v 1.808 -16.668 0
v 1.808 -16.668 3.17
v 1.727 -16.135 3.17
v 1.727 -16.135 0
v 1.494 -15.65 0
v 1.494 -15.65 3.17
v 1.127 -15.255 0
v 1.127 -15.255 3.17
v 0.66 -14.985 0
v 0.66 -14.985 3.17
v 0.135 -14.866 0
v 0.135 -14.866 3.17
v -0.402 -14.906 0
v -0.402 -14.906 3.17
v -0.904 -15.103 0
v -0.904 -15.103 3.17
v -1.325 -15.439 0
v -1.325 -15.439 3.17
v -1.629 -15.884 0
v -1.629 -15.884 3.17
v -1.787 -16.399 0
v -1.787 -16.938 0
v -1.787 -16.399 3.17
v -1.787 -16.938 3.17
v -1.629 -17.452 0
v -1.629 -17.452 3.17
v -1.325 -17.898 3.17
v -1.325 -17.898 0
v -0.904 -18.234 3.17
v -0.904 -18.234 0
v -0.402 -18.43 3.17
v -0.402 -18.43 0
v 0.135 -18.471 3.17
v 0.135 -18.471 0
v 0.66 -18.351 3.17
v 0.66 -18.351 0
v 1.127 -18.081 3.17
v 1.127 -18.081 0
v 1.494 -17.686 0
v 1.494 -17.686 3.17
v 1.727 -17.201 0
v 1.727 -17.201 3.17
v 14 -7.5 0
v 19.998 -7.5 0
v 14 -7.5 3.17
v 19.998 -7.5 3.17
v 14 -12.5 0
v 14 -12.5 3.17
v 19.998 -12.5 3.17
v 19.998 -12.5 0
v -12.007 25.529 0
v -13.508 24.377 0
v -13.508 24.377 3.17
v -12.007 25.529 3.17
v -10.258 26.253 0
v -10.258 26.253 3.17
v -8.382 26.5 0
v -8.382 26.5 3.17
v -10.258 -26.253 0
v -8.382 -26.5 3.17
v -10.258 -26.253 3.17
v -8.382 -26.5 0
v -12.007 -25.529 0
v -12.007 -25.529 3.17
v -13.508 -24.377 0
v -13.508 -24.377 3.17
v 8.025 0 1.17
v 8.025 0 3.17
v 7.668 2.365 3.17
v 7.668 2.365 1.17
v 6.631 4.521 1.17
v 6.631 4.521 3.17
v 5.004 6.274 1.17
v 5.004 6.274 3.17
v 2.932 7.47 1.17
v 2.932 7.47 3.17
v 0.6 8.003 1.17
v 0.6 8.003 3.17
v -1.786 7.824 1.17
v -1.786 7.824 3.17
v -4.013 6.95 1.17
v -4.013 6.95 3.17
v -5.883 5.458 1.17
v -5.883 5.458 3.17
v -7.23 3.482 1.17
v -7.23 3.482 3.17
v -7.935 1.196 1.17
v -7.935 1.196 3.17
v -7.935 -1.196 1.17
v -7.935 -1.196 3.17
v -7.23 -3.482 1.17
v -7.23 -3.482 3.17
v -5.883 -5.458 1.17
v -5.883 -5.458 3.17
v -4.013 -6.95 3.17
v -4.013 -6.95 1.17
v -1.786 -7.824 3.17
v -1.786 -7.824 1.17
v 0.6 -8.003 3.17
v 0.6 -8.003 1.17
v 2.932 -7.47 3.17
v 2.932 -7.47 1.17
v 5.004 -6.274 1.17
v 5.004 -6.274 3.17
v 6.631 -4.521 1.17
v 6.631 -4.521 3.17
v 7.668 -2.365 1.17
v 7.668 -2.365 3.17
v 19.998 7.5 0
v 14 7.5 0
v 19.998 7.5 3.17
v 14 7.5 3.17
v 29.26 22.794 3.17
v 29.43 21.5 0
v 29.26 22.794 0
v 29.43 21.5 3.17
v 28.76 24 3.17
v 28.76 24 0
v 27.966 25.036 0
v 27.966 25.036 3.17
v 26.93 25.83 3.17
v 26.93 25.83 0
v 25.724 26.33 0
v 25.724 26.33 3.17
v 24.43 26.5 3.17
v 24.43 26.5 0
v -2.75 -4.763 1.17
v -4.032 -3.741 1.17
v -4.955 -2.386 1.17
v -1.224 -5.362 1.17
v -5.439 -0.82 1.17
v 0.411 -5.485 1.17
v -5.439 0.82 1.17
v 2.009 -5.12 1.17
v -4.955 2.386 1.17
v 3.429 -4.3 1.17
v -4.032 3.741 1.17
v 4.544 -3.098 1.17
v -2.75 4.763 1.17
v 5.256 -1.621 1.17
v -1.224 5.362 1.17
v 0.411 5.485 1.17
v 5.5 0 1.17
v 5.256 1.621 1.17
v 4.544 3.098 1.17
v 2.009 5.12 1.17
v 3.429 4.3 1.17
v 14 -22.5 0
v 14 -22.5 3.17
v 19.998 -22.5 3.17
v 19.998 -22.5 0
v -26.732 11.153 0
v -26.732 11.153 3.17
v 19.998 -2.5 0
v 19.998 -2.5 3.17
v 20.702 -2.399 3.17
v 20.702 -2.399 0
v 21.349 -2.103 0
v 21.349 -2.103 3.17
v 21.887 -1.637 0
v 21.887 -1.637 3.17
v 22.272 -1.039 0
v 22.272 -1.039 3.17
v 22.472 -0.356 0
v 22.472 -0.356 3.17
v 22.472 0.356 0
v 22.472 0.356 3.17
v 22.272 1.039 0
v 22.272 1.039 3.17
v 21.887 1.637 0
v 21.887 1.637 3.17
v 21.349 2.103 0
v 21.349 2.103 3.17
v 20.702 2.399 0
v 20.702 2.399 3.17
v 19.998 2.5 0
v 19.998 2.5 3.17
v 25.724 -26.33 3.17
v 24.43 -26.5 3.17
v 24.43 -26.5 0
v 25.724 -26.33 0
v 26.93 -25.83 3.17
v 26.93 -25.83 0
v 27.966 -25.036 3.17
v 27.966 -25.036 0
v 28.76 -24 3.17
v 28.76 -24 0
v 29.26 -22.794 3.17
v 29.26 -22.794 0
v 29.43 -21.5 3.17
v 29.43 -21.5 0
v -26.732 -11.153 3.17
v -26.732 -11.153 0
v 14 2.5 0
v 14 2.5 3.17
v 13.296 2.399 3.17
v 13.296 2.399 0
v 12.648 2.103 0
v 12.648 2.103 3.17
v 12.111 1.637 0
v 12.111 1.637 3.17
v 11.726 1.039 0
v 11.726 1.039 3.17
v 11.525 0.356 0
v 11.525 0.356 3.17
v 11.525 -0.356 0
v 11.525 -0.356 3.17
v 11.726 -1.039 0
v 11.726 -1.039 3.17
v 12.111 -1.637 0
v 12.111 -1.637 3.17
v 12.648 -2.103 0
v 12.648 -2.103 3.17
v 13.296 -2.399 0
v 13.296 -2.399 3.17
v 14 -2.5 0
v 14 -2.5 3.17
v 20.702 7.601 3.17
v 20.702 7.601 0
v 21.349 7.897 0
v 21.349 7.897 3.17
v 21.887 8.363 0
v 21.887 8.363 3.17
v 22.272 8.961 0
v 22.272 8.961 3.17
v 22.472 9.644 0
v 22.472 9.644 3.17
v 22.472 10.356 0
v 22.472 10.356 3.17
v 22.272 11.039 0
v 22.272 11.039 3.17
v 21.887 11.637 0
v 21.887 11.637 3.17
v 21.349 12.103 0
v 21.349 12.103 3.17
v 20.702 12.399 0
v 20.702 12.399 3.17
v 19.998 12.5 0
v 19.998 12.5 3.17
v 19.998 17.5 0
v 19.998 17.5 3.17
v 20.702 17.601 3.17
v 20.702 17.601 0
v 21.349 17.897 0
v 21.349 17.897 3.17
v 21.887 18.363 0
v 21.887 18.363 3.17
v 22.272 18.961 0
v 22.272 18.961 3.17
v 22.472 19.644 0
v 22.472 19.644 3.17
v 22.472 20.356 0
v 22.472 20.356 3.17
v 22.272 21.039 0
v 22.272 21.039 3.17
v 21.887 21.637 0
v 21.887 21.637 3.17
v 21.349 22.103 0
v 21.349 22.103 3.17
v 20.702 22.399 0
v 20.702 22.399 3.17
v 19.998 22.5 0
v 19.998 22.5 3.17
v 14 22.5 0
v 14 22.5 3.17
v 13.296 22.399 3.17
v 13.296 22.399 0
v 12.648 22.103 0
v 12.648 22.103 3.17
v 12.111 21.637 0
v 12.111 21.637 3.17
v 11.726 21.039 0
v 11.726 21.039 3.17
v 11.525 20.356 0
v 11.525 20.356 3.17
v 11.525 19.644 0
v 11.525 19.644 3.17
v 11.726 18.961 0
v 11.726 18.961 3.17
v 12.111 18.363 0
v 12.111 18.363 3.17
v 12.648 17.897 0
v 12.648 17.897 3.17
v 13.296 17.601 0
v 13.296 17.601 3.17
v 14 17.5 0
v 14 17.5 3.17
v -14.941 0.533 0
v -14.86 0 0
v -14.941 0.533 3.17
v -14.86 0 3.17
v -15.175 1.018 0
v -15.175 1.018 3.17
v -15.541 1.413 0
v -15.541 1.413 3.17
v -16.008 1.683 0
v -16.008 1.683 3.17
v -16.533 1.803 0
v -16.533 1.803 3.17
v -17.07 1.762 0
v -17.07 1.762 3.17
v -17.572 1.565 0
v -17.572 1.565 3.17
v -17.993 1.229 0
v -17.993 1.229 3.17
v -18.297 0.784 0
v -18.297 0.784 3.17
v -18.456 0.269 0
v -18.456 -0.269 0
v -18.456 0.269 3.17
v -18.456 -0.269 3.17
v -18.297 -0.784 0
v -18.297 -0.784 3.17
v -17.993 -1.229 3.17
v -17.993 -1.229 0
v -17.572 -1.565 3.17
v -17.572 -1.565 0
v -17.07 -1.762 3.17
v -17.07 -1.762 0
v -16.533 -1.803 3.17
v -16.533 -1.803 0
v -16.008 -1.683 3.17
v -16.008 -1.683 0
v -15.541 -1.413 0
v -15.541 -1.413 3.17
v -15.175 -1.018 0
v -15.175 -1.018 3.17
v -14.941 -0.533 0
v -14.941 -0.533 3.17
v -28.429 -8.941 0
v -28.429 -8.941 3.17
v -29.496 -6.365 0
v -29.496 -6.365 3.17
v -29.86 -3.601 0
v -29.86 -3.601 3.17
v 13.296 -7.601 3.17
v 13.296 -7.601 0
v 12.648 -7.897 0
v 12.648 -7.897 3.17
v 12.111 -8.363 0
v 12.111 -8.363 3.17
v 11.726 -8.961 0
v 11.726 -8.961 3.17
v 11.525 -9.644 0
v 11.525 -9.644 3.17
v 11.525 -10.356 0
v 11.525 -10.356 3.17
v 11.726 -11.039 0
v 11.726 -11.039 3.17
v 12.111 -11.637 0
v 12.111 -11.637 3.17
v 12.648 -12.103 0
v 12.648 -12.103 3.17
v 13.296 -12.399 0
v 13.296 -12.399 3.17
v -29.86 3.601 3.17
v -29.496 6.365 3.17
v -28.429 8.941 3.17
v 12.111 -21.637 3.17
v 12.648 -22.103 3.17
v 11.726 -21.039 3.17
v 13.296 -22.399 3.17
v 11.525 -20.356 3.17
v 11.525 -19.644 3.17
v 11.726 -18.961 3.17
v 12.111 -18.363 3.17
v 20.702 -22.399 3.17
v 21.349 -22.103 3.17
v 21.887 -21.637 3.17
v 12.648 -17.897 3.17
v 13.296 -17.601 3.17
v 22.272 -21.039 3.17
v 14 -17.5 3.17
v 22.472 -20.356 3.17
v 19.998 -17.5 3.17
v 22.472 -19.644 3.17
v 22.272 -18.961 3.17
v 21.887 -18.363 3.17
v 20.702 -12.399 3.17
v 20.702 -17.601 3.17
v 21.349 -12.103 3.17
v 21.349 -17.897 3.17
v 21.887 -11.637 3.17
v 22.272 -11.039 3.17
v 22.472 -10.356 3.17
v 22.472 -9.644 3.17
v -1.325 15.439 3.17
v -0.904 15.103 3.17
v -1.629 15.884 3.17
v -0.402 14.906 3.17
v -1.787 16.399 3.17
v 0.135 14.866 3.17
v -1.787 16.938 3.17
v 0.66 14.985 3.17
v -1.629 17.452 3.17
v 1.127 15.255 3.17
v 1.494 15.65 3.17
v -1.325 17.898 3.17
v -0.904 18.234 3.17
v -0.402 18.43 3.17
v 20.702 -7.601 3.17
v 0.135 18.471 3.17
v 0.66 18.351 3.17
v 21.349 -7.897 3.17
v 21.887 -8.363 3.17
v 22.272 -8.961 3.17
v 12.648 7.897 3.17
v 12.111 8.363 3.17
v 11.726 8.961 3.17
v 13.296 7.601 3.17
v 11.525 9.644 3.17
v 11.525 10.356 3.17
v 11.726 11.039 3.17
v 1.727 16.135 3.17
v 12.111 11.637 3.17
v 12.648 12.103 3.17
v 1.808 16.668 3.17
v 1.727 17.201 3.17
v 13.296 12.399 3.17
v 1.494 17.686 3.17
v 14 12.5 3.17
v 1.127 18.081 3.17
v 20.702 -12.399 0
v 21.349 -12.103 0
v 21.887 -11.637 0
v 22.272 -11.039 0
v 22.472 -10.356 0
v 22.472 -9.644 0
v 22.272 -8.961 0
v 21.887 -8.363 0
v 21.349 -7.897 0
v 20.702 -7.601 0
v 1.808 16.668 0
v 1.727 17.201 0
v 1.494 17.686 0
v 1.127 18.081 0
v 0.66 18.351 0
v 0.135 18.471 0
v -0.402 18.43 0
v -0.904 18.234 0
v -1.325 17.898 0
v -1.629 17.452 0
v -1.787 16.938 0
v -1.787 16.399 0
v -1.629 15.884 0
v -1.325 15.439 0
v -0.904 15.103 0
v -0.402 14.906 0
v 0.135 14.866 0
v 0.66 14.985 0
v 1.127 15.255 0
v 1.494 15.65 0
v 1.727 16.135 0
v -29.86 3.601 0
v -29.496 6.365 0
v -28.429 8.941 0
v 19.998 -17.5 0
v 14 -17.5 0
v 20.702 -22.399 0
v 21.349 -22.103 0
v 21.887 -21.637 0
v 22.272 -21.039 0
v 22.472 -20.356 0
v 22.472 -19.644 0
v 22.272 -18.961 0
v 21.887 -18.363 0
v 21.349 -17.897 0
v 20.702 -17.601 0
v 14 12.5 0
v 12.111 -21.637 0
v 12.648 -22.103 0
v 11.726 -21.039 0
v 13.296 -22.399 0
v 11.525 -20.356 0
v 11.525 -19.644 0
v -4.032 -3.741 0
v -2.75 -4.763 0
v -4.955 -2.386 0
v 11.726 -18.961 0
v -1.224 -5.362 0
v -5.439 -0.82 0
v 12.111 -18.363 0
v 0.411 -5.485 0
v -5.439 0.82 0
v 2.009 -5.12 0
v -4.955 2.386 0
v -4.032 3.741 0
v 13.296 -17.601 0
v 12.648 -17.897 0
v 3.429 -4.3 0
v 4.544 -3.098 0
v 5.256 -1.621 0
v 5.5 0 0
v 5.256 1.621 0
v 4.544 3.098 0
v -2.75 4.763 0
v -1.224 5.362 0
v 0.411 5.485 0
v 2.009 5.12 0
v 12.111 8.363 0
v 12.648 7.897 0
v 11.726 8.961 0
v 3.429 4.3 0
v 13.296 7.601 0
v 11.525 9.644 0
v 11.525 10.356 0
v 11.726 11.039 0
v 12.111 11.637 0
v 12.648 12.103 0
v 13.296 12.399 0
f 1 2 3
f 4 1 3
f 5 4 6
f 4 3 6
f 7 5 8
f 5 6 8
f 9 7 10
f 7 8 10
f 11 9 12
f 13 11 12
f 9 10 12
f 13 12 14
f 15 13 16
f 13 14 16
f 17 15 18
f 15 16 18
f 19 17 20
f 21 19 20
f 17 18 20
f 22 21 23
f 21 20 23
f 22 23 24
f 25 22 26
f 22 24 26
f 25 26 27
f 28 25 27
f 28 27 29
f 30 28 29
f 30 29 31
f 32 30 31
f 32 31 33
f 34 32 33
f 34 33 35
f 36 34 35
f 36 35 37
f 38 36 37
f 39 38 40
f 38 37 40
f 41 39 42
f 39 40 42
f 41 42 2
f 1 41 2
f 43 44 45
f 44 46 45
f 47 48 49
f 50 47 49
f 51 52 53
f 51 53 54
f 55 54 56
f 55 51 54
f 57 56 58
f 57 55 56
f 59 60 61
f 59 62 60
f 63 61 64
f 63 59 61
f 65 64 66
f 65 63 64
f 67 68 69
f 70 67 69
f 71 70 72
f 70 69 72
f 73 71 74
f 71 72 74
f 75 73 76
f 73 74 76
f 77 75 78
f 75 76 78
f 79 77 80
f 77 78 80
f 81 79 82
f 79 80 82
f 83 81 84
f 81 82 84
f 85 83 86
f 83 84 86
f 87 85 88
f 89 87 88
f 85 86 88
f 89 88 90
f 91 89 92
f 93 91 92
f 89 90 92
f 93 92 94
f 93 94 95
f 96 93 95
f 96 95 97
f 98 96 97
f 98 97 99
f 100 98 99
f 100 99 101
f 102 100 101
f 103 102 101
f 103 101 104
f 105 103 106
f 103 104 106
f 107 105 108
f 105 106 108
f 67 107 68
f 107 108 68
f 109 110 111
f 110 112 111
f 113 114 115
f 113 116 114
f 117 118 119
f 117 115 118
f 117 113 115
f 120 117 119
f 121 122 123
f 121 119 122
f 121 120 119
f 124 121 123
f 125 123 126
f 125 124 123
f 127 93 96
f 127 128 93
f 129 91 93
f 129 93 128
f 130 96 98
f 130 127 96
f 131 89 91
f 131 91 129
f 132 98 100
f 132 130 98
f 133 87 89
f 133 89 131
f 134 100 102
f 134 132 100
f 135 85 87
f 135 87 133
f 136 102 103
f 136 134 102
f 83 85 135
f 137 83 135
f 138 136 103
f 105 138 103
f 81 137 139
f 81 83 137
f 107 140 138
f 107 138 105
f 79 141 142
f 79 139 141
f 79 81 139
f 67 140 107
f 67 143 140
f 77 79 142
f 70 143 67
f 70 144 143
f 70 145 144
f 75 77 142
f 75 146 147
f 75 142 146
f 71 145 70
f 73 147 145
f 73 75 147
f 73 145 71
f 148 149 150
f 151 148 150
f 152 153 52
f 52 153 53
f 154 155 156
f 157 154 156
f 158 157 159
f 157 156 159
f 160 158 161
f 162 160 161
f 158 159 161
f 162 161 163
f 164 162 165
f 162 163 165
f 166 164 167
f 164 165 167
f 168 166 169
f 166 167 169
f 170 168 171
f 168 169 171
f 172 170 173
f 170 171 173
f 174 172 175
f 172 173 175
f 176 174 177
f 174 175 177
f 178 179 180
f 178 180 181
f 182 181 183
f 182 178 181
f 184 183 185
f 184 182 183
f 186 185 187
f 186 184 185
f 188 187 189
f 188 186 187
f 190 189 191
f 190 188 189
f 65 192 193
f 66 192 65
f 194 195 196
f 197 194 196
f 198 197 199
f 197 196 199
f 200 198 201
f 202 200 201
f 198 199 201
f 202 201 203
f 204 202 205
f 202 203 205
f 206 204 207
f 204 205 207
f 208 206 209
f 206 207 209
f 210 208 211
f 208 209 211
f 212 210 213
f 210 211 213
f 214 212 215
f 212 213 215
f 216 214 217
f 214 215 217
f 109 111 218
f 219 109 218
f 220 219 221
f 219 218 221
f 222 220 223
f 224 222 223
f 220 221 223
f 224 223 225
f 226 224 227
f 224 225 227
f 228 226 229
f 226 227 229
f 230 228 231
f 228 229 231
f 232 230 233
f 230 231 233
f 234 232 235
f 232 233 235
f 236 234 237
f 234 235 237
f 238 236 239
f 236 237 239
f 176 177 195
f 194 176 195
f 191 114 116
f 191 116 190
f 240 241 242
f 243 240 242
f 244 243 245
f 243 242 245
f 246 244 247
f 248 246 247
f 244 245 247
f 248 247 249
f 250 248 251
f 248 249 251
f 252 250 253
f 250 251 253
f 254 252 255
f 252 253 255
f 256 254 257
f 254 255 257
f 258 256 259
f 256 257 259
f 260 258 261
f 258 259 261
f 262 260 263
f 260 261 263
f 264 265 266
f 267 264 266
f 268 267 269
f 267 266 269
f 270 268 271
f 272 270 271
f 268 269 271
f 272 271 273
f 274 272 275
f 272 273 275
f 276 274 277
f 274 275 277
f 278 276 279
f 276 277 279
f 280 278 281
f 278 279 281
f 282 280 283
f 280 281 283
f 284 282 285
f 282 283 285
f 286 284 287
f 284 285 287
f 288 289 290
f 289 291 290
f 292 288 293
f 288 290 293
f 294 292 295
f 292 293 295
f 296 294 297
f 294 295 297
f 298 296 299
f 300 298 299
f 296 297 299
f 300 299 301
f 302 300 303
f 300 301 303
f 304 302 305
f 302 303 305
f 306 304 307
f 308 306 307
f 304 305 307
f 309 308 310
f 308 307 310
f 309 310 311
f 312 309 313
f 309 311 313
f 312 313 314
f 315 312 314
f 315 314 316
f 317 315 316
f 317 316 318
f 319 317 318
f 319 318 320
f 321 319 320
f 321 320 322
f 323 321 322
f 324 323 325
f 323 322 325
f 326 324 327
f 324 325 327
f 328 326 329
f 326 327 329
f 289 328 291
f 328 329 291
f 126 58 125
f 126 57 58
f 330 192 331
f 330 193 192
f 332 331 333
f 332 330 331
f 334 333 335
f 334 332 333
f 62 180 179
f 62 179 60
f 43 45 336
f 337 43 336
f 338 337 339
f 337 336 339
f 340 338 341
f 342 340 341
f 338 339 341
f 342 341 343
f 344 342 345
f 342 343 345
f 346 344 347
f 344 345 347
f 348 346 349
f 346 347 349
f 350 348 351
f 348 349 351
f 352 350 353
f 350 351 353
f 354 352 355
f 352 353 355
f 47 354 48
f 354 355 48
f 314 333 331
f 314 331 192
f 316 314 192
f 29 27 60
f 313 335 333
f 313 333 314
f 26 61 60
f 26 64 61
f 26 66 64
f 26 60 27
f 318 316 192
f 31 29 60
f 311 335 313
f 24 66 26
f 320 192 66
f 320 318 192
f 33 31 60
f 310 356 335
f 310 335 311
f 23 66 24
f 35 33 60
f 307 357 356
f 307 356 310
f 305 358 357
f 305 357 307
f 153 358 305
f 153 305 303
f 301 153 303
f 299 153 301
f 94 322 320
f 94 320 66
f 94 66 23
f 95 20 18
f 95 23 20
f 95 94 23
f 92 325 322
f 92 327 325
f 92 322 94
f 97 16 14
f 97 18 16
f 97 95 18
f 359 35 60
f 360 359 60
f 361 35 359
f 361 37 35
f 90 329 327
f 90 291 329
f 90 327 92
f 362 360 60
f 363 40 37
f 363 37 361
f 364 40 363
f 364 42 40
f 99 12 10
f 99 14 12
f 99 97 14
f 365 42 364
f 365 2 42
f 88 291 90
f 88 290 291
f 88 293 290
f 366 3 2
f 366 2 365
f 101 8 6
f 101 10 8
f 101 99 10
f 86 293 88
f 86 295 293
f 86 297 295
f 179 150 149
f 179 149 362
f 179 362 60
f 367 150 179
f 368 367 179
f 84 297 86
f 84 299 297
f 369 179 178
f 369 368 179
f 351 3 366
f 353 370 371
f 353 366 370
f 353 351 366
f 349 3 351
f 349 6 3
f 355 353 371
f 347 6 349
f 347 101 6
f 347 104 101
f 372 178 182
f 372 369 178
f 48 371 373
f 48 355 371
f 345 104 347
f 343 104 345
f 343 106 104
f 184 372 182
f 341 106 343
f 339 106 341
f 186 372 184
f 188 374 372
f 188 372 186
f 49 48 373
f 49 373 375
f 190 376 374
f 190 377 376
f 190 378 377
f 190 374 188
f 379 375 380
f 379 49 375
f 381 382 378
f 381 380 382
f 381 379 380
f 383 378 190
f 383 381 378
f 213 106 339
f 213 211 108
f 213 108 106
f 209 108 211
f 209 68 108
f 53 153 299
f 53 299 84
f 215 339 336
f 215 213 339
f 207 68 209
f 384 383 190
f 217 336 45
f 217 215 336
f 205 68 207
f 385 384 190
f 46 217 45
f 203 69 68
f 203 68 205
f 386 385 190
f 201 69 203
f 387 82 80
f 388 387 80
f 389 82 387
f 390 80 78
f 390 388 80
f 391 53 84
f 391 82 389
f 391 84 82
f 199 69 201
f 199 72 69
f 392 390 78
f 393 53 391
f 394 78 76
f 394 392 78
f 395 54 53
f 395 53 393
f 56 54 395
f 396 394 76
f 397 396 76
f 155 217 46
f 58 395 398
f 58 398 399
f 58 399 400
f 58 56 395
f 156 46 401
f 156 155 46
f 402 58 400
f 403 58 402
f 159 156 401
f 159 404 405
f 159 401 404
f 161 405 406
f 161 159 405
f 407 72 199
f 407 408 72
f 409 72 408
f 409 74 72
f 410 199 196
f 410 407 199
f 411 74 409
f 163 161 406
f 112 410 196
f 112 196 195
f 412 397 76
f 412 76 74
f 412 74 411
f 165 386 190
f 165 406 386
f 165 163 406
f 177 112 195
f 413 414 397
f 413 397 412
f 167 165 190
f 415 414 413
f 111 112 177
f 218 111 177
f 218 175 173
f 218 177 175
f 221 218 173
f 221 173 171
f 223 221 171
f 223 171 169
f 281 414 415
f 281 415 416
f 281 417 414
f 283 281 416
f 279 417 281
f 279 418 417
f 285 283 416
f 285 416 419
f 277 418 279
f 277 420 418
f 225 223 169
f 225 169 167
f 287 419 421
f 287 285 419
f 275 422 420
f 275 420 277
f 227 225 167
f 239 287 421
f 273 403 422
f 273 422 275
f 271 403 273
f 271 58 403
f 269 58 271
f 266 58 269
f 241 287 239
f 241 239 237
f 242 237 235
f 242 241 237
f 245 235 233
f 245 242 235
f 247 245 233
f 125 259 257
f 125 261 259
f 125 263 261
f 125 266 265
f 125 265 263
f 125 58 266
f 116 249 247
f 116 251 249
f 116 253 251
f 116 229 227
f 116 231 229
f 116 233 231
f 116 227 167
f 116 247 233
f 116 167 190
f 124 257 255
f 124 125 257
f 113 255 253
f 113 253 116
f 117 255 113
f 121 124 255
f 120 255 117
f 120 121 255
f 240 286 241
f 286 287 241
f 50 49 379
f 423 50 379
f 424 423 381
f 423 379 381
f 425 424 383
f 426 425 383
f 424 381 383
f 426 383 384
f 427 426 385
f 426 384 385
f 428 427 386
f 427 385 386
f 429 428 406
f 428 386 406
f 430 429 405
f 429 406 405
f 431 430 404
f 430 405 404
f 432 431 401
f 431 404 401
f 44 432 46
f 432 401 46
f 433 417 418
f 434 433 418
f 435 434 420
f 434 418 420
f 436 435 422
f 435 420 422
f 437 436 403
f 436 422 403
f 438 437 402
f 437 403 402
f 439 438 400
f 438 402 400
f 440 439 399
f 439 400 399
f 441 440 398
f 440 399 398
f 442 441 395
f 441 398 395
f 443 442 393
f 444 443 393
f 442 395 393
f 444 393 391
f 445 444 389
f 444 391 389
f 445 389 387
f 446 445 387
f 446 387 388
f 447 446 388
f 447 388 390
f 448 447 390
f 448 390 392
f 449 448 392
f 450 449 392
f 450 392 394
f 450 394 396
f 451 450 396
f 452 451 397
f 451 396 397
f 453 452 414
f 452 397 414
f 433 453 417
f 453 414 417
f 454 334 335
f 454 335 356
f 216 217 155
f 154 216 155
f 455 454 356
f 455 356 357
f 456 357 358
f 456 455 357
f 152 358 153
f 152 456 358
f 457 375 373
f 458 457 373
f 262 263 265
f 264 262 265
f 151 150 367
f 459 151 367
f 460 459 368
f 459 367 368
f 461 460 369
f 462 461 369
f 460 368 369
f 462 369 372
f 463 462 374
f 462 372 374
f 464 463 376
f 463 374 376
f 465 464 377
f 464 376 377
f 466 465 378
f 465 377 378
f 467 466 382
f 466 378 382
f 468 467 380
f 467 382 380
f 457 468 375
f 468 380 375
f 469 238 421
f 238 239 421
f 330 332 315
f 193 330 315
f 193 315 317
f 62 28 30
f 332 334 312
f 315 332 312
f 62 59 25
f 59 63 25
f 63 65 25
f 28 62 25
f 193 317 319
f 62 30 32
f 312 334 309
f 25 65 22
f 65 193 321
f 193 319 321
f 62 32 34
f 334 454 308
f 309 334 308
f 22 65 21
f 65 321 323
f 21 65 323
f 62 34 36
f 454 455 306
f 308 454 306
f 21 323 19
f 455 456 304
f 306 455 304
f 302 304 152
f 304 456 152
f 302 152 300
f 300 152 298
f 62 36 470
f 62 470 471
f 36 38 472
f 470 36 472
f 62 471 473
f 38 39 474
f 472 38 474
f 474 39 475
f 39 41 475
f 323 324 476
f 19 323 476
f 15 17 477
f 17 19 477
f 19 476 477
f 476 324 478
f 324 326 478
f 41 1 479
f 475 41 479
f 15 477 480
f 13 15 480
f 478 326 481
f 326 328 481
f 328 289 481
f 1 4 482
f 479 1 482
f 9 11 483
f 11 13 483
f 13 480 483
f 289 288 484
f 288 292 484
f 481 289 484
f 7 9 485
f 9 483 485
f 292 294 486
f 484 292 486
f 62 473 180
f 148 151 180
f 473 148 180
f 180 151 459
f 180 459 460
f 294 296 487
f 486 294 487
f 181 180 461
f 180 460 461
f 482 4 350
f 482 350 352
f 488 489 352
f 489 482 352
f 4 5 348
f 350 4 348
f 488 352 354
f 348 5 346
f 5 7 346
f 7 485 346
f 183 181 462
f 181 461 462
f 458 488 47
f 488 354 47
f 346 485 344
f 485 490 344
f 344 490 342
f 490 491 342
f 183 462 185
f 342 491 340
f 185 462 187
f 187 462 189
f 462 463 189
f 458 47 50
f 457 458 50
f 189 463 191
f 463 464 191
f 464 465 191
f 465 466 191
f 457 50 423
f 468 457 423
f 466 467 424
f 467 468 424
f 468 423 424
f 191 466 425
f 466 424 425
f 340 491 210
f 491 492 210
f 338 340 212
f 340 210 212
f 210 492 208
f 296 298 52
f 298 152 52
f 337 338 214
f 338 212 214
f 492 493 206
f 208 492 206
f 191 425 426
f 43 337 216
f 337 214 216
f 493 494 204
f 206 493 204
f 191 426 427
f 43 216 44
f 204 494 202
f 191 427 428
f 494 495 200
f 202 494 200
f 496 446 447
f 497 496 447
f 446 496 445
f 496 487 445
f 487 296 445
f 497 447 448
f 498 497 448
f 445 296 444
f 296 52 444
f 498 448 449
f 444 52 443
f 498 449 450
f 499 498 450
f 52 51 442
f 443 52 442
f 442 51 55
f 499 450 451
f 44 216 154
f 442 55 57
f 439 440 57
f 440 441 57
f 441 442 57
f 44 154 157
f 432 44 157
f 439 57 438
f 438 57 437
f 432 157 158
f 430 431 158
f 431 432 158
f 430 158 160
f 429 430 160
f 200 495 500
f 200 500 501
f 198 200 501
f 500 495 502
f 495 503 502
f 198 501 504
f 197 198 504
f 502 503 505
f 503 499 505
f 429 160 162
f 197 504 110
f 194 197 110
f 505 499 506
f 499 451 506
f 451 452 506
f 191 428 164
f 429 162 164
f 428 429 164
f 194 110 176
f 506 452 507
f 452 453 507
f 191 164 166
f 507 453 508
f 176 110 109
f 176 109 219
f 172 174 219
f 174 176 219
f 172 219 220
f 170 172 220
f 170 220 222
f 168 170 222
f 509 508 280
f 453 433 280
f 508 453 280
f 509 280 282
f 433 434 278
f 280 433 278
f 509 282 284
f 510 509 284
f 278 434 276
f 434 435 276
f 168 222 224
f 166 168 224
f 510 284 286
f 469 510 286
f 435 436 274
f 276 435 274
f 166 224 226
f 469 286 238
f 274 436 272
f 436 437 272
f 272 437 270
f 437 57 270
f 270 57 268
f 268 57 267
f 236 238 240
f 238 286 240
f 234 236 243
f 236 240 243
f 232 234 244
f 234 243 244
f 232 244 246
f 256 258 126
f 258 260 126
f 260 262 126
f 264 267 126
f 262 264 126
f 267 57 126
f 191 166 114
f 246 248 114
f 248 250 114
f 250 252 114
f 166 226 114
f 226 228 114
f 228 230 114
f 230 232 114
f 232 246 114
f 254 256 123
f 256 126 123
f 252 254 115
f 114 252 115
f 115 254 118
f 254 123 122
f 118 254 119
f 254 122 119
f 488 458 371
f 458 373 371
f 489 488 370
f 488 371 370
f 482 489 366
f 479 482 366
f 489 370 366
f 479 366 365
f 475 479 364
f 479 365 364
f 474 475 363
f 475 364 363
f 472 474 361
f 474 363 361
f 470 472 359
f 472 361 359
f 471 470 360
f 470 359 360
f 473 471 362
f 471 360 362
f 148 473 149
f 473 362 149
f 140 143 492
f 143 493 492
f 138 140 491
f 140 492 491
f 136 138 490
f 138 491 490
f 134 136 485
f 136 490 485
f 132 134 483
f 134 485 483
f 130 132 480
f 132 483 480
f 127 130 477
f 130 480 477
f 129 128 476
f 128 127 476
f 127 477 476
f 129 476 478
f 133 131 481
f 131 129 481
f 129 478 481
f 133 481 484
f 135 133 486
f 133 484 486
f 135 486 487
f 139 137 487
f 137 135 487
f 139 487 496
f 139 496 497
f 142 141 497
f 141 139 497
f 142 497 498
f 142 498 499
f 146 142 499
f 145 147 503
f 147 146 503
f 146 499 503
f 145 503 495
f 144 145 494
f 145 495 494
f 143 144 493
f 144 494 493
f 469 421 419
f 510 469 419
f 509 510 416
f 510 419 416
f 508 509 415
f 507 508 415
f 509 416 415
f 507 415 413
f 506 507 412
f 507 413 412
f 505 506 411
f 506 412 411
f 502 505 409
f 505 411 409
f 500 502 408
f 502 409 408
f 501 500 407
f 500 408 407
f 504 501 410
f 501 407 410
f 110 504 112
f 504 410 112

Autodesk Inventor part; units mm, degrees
ref_plane "YZ Plane" through (0, 0, 0) normal (1, 0, 0) x (0, 1, 0)
ref_plane "XZ Plane" through (0, 0, 0) normal (0, 1, 0) x (-1, 0, 0)
ref_plane "XY Plane" through (0, 0, 0) normal (0, 0, 1) x (1, 0, 0)
sketch "Sketch1" plane through (0, 0, 0) normal (0, 0, 1) x (1, 0, 0)
  line L0 (-29.86, 26.5) -> (29.43, 26.5)
  line L1 (29.43, 26.5) -> (29.43, -26.5)
  line L2 (29.43, -26.5) -> (-29.86, -26.5)
  line L3 (-29.86, -26.5) -> (-29.86, 26.5)
  line L4 (-29.86, 0) -> (29.43, 0) construction
  circle A0 centre (0, 0) radius 5.5
  dimension "d0" = 29.86
  dimension "d1" = 59.29
  dimension "d2" = 53
  dimension "d3" = 11
extrude "Extrusion1" add sketch "Sketch1" along normal blind 3.17
sketch "Sketch2" plane through (0, 0, 3.17) normal (0, 0, 1) x (1, 0, 0)
  circle A0 centre (0, 0) radius 5.5 projected
  line L0 (29.43, -26.5) -> (29.43, 26.5) projected
  line L1 (0, 0) -> (0, 49.2966)
  circle A1 centre (0, 16.6681) radius 1.8076
  circle A2 centre (-16.6681, 0) radius 1.8076
  circle A3 centre (0, -16.6681) radius 1.8076
  dimension "d8" = 180
extrude "Extrusion2" cut sketch "Sketch2" against normal up to next contours A1 L1 | L1 A1 | A2 | A3
sketch "Sketch3" plane through (0, 0, 3.17) normal (0, 0, 1) x (1, 0, 0)
  circle A0 centre (0, 0) radius 5.5 projected
  circle A1 centre (0, 0) radius 8.025
  dimension "d12" = 16.05
extrude "Extrusion3" cut sketch "Sketch3" against normal blind 2
sketch "Sketch4" plane through (0, 0, 3.17) normal (0, 0, 1) x (1, 0, 0)
  line L0 (29.43, 26.5) -> (-29.86, 26.5) projected
  line L1 (-29.86, 26.5) -> (-29.86, -26.5) projected
  line L2 (29.43, -26.5) -> (29.43, 26.5) projected
  line L3 (14, 0) -> (19.9977, 0) construction
  line L4 (14, -2.5) -> (19.9977, -2.5)
  line L5 (19.9977, 2.5) -> (14, 2.5)
  arc A0 (14, 2.5) -> (14, -2.5) centre (14, 0) ccw
  arc A1 (19.9977, -2.5) -> (19.9977, 2.5) centre (19.9977, 0) ccw
  line L6 (14, 10) -> (19.9977, 10) construction
  line L7 (14, 7.5) -> (19.9977, 7.5)
  line L8 (19.9977, 12.5) -> (14, 12.5)
  arc A2 (14, 12.5) -> (14, 7.5) centre (14, 10) ccw
  arc A3 (19.9977, 7.5) -> (19.9977, 12.5) centre (19.9977, 10) ccw
  line L9 (14, 20) -> (19.9977, 20) construction
  line L10 (14, 17.5) -> (19.9977, 17.5)
  line L11 (19.9977, 22.5) -> (14, 22.5)
  arc A4 (14, 22.5) -> (14, 17.5) centre (14, 20) ccw
  arc A5 (19.9977, 17.5) -> (19.9977, 22.5) centre (19.9977, 20) ccw
  line L12 (14, -10) -> (19.9977, -10) construction
  line L13 (14, -12.5) -> (19.9977, -12.5)
  line L14 (19.9977, -7.5) -> (14, -7.5)
  arc A6 (14, -7.5) -> (14, -12.5) centre (14, -10) ccw
  arc A7 (19.9977, -12.5) -> (19.9977, -7.5) centre (19.9977, -10) ccw
  line L15 (14, 0) -> (19.9977, 0) construction
  line L16 (14, -2.5) -> (19.9977, -2.5)
  line L17 (19.9977, 2.5) -> (14, 2.5)
  arc A8 (14, 2.5) -> (14, -2.5) centre (14, 0) ccw
  arc A9 (19.9977, -2.5) -> (19.9977, 2.5) centre (19.9977, 0) ccw
  line L18 (14, 10) -> (19.9977, 10) construction
  line L19 (14, 7.5) -> (19.9977, 7.5)
  line L20 (19.9977, 12.5) -> (14, 12.5)
  arc A10 (14, 12.5) -> (14, 7.5) centre (14, 10) ccw
  arc A11 (19.9977, 7.5) -> (19.9977, 12.5) centre (19.9977, 10) ccw
  line L21 (14, -20) -> (19.9977, -20) construction
  line L22 (14, -22.5) -> (19.9977, -22.5)
  line L23 (19.9977, -17.5) -> (14, -17.5)
  arc A12 (14, -17.5) -> (14, -22.5) centre (14, -20) ccw
  arc A13 (19.9977, -22.5) -> (19.9977, -17.5) centre (19.9977, -20) ccw
  line L24 (14, -10) -> (19.9977, -10) construction
  line L25 (14, -12.5) -> (19.9977, -12.5)
  line L26 (19.9977, -7.5) -> (14, -7.5)
  arc A14 (14, -7.5) -> (14, -12.5) centre (14, -10) ccw
  arc A15 (19.9977, -12.5) -> (19.9977, -7.5) centre (19.9977, -10) ccw
  line L27 (14, 0) -> (19.9977, 0) construction
  line L28 (14, -2.5) -> (19.9977, -2.5)
  line L29 (19.9977, 2.5) -> (14, 2.5)
  arc A16 (14, 2.5) -> (14, -2.5) centre (14, 0) ccw
  arc A17 (19.9977, -2.5) -> (19.9977, 2.5) centre (19.9977, 0) ccw
  point P0 (16.9988, 0)
  point P1 (16.9988, 10)
  point P2 (16.9988, 20)
  point P3 (16.9988, -10)
  point P4 (16.9988, 0)
  point P5 (16.9988, 10)
  point P6 (16.9988, -20)
  point P7 (16.9988, -10)
  point P8 (16.9988, 0)
  dimension "d15" = 5
  dimension "d16" = 43.86
  dimension "d19" = 10
  dimension "d22" = 10
extrude "Extrusion4" cut sketch "Sketch4" against normal up to next
sketch "Sketch5" plane through (0, 0, 3.17) normal (0, 0, 1) x (1, 0, 0)
  line L0 (29.43, 26.5) -> (-29.86, 26.5) projected
  line L1 (-29.86, 26.5) -> (-29.86, -26.5) projected
  line L2 (-29.86, -26.5) -> (29.43, -26.5) projected
  line L3 (-29.86, 8.025) -> (-11.385, 26.5)
  line L4 (-29.86, 8.025) -> (-3.7324, 8.025) construction
  line L5 (-29.86, -8.025) -> (-11.385, -26.5)
  dimension "d27" = 45
extrude "Extrusion5" cut sketch "Sketch5" against normal up to next
fillet "Fillet1" radius 7.25 2 edges at (-11.385, -26.5, 1.585) (-11.385, 26.5, 1.585)
fillet "Fillet2" radius 10.68 2 edges at (-29.86, -8.025, 1.585) (-29.86, 8.025, 1.585)
fillet "Fillet3" radius 5 2 edges at (29.43, 26.5, 1.585) (29.43, -26.5, 1.585)
properties part number "VSLOT Threaded Rod Plate"
